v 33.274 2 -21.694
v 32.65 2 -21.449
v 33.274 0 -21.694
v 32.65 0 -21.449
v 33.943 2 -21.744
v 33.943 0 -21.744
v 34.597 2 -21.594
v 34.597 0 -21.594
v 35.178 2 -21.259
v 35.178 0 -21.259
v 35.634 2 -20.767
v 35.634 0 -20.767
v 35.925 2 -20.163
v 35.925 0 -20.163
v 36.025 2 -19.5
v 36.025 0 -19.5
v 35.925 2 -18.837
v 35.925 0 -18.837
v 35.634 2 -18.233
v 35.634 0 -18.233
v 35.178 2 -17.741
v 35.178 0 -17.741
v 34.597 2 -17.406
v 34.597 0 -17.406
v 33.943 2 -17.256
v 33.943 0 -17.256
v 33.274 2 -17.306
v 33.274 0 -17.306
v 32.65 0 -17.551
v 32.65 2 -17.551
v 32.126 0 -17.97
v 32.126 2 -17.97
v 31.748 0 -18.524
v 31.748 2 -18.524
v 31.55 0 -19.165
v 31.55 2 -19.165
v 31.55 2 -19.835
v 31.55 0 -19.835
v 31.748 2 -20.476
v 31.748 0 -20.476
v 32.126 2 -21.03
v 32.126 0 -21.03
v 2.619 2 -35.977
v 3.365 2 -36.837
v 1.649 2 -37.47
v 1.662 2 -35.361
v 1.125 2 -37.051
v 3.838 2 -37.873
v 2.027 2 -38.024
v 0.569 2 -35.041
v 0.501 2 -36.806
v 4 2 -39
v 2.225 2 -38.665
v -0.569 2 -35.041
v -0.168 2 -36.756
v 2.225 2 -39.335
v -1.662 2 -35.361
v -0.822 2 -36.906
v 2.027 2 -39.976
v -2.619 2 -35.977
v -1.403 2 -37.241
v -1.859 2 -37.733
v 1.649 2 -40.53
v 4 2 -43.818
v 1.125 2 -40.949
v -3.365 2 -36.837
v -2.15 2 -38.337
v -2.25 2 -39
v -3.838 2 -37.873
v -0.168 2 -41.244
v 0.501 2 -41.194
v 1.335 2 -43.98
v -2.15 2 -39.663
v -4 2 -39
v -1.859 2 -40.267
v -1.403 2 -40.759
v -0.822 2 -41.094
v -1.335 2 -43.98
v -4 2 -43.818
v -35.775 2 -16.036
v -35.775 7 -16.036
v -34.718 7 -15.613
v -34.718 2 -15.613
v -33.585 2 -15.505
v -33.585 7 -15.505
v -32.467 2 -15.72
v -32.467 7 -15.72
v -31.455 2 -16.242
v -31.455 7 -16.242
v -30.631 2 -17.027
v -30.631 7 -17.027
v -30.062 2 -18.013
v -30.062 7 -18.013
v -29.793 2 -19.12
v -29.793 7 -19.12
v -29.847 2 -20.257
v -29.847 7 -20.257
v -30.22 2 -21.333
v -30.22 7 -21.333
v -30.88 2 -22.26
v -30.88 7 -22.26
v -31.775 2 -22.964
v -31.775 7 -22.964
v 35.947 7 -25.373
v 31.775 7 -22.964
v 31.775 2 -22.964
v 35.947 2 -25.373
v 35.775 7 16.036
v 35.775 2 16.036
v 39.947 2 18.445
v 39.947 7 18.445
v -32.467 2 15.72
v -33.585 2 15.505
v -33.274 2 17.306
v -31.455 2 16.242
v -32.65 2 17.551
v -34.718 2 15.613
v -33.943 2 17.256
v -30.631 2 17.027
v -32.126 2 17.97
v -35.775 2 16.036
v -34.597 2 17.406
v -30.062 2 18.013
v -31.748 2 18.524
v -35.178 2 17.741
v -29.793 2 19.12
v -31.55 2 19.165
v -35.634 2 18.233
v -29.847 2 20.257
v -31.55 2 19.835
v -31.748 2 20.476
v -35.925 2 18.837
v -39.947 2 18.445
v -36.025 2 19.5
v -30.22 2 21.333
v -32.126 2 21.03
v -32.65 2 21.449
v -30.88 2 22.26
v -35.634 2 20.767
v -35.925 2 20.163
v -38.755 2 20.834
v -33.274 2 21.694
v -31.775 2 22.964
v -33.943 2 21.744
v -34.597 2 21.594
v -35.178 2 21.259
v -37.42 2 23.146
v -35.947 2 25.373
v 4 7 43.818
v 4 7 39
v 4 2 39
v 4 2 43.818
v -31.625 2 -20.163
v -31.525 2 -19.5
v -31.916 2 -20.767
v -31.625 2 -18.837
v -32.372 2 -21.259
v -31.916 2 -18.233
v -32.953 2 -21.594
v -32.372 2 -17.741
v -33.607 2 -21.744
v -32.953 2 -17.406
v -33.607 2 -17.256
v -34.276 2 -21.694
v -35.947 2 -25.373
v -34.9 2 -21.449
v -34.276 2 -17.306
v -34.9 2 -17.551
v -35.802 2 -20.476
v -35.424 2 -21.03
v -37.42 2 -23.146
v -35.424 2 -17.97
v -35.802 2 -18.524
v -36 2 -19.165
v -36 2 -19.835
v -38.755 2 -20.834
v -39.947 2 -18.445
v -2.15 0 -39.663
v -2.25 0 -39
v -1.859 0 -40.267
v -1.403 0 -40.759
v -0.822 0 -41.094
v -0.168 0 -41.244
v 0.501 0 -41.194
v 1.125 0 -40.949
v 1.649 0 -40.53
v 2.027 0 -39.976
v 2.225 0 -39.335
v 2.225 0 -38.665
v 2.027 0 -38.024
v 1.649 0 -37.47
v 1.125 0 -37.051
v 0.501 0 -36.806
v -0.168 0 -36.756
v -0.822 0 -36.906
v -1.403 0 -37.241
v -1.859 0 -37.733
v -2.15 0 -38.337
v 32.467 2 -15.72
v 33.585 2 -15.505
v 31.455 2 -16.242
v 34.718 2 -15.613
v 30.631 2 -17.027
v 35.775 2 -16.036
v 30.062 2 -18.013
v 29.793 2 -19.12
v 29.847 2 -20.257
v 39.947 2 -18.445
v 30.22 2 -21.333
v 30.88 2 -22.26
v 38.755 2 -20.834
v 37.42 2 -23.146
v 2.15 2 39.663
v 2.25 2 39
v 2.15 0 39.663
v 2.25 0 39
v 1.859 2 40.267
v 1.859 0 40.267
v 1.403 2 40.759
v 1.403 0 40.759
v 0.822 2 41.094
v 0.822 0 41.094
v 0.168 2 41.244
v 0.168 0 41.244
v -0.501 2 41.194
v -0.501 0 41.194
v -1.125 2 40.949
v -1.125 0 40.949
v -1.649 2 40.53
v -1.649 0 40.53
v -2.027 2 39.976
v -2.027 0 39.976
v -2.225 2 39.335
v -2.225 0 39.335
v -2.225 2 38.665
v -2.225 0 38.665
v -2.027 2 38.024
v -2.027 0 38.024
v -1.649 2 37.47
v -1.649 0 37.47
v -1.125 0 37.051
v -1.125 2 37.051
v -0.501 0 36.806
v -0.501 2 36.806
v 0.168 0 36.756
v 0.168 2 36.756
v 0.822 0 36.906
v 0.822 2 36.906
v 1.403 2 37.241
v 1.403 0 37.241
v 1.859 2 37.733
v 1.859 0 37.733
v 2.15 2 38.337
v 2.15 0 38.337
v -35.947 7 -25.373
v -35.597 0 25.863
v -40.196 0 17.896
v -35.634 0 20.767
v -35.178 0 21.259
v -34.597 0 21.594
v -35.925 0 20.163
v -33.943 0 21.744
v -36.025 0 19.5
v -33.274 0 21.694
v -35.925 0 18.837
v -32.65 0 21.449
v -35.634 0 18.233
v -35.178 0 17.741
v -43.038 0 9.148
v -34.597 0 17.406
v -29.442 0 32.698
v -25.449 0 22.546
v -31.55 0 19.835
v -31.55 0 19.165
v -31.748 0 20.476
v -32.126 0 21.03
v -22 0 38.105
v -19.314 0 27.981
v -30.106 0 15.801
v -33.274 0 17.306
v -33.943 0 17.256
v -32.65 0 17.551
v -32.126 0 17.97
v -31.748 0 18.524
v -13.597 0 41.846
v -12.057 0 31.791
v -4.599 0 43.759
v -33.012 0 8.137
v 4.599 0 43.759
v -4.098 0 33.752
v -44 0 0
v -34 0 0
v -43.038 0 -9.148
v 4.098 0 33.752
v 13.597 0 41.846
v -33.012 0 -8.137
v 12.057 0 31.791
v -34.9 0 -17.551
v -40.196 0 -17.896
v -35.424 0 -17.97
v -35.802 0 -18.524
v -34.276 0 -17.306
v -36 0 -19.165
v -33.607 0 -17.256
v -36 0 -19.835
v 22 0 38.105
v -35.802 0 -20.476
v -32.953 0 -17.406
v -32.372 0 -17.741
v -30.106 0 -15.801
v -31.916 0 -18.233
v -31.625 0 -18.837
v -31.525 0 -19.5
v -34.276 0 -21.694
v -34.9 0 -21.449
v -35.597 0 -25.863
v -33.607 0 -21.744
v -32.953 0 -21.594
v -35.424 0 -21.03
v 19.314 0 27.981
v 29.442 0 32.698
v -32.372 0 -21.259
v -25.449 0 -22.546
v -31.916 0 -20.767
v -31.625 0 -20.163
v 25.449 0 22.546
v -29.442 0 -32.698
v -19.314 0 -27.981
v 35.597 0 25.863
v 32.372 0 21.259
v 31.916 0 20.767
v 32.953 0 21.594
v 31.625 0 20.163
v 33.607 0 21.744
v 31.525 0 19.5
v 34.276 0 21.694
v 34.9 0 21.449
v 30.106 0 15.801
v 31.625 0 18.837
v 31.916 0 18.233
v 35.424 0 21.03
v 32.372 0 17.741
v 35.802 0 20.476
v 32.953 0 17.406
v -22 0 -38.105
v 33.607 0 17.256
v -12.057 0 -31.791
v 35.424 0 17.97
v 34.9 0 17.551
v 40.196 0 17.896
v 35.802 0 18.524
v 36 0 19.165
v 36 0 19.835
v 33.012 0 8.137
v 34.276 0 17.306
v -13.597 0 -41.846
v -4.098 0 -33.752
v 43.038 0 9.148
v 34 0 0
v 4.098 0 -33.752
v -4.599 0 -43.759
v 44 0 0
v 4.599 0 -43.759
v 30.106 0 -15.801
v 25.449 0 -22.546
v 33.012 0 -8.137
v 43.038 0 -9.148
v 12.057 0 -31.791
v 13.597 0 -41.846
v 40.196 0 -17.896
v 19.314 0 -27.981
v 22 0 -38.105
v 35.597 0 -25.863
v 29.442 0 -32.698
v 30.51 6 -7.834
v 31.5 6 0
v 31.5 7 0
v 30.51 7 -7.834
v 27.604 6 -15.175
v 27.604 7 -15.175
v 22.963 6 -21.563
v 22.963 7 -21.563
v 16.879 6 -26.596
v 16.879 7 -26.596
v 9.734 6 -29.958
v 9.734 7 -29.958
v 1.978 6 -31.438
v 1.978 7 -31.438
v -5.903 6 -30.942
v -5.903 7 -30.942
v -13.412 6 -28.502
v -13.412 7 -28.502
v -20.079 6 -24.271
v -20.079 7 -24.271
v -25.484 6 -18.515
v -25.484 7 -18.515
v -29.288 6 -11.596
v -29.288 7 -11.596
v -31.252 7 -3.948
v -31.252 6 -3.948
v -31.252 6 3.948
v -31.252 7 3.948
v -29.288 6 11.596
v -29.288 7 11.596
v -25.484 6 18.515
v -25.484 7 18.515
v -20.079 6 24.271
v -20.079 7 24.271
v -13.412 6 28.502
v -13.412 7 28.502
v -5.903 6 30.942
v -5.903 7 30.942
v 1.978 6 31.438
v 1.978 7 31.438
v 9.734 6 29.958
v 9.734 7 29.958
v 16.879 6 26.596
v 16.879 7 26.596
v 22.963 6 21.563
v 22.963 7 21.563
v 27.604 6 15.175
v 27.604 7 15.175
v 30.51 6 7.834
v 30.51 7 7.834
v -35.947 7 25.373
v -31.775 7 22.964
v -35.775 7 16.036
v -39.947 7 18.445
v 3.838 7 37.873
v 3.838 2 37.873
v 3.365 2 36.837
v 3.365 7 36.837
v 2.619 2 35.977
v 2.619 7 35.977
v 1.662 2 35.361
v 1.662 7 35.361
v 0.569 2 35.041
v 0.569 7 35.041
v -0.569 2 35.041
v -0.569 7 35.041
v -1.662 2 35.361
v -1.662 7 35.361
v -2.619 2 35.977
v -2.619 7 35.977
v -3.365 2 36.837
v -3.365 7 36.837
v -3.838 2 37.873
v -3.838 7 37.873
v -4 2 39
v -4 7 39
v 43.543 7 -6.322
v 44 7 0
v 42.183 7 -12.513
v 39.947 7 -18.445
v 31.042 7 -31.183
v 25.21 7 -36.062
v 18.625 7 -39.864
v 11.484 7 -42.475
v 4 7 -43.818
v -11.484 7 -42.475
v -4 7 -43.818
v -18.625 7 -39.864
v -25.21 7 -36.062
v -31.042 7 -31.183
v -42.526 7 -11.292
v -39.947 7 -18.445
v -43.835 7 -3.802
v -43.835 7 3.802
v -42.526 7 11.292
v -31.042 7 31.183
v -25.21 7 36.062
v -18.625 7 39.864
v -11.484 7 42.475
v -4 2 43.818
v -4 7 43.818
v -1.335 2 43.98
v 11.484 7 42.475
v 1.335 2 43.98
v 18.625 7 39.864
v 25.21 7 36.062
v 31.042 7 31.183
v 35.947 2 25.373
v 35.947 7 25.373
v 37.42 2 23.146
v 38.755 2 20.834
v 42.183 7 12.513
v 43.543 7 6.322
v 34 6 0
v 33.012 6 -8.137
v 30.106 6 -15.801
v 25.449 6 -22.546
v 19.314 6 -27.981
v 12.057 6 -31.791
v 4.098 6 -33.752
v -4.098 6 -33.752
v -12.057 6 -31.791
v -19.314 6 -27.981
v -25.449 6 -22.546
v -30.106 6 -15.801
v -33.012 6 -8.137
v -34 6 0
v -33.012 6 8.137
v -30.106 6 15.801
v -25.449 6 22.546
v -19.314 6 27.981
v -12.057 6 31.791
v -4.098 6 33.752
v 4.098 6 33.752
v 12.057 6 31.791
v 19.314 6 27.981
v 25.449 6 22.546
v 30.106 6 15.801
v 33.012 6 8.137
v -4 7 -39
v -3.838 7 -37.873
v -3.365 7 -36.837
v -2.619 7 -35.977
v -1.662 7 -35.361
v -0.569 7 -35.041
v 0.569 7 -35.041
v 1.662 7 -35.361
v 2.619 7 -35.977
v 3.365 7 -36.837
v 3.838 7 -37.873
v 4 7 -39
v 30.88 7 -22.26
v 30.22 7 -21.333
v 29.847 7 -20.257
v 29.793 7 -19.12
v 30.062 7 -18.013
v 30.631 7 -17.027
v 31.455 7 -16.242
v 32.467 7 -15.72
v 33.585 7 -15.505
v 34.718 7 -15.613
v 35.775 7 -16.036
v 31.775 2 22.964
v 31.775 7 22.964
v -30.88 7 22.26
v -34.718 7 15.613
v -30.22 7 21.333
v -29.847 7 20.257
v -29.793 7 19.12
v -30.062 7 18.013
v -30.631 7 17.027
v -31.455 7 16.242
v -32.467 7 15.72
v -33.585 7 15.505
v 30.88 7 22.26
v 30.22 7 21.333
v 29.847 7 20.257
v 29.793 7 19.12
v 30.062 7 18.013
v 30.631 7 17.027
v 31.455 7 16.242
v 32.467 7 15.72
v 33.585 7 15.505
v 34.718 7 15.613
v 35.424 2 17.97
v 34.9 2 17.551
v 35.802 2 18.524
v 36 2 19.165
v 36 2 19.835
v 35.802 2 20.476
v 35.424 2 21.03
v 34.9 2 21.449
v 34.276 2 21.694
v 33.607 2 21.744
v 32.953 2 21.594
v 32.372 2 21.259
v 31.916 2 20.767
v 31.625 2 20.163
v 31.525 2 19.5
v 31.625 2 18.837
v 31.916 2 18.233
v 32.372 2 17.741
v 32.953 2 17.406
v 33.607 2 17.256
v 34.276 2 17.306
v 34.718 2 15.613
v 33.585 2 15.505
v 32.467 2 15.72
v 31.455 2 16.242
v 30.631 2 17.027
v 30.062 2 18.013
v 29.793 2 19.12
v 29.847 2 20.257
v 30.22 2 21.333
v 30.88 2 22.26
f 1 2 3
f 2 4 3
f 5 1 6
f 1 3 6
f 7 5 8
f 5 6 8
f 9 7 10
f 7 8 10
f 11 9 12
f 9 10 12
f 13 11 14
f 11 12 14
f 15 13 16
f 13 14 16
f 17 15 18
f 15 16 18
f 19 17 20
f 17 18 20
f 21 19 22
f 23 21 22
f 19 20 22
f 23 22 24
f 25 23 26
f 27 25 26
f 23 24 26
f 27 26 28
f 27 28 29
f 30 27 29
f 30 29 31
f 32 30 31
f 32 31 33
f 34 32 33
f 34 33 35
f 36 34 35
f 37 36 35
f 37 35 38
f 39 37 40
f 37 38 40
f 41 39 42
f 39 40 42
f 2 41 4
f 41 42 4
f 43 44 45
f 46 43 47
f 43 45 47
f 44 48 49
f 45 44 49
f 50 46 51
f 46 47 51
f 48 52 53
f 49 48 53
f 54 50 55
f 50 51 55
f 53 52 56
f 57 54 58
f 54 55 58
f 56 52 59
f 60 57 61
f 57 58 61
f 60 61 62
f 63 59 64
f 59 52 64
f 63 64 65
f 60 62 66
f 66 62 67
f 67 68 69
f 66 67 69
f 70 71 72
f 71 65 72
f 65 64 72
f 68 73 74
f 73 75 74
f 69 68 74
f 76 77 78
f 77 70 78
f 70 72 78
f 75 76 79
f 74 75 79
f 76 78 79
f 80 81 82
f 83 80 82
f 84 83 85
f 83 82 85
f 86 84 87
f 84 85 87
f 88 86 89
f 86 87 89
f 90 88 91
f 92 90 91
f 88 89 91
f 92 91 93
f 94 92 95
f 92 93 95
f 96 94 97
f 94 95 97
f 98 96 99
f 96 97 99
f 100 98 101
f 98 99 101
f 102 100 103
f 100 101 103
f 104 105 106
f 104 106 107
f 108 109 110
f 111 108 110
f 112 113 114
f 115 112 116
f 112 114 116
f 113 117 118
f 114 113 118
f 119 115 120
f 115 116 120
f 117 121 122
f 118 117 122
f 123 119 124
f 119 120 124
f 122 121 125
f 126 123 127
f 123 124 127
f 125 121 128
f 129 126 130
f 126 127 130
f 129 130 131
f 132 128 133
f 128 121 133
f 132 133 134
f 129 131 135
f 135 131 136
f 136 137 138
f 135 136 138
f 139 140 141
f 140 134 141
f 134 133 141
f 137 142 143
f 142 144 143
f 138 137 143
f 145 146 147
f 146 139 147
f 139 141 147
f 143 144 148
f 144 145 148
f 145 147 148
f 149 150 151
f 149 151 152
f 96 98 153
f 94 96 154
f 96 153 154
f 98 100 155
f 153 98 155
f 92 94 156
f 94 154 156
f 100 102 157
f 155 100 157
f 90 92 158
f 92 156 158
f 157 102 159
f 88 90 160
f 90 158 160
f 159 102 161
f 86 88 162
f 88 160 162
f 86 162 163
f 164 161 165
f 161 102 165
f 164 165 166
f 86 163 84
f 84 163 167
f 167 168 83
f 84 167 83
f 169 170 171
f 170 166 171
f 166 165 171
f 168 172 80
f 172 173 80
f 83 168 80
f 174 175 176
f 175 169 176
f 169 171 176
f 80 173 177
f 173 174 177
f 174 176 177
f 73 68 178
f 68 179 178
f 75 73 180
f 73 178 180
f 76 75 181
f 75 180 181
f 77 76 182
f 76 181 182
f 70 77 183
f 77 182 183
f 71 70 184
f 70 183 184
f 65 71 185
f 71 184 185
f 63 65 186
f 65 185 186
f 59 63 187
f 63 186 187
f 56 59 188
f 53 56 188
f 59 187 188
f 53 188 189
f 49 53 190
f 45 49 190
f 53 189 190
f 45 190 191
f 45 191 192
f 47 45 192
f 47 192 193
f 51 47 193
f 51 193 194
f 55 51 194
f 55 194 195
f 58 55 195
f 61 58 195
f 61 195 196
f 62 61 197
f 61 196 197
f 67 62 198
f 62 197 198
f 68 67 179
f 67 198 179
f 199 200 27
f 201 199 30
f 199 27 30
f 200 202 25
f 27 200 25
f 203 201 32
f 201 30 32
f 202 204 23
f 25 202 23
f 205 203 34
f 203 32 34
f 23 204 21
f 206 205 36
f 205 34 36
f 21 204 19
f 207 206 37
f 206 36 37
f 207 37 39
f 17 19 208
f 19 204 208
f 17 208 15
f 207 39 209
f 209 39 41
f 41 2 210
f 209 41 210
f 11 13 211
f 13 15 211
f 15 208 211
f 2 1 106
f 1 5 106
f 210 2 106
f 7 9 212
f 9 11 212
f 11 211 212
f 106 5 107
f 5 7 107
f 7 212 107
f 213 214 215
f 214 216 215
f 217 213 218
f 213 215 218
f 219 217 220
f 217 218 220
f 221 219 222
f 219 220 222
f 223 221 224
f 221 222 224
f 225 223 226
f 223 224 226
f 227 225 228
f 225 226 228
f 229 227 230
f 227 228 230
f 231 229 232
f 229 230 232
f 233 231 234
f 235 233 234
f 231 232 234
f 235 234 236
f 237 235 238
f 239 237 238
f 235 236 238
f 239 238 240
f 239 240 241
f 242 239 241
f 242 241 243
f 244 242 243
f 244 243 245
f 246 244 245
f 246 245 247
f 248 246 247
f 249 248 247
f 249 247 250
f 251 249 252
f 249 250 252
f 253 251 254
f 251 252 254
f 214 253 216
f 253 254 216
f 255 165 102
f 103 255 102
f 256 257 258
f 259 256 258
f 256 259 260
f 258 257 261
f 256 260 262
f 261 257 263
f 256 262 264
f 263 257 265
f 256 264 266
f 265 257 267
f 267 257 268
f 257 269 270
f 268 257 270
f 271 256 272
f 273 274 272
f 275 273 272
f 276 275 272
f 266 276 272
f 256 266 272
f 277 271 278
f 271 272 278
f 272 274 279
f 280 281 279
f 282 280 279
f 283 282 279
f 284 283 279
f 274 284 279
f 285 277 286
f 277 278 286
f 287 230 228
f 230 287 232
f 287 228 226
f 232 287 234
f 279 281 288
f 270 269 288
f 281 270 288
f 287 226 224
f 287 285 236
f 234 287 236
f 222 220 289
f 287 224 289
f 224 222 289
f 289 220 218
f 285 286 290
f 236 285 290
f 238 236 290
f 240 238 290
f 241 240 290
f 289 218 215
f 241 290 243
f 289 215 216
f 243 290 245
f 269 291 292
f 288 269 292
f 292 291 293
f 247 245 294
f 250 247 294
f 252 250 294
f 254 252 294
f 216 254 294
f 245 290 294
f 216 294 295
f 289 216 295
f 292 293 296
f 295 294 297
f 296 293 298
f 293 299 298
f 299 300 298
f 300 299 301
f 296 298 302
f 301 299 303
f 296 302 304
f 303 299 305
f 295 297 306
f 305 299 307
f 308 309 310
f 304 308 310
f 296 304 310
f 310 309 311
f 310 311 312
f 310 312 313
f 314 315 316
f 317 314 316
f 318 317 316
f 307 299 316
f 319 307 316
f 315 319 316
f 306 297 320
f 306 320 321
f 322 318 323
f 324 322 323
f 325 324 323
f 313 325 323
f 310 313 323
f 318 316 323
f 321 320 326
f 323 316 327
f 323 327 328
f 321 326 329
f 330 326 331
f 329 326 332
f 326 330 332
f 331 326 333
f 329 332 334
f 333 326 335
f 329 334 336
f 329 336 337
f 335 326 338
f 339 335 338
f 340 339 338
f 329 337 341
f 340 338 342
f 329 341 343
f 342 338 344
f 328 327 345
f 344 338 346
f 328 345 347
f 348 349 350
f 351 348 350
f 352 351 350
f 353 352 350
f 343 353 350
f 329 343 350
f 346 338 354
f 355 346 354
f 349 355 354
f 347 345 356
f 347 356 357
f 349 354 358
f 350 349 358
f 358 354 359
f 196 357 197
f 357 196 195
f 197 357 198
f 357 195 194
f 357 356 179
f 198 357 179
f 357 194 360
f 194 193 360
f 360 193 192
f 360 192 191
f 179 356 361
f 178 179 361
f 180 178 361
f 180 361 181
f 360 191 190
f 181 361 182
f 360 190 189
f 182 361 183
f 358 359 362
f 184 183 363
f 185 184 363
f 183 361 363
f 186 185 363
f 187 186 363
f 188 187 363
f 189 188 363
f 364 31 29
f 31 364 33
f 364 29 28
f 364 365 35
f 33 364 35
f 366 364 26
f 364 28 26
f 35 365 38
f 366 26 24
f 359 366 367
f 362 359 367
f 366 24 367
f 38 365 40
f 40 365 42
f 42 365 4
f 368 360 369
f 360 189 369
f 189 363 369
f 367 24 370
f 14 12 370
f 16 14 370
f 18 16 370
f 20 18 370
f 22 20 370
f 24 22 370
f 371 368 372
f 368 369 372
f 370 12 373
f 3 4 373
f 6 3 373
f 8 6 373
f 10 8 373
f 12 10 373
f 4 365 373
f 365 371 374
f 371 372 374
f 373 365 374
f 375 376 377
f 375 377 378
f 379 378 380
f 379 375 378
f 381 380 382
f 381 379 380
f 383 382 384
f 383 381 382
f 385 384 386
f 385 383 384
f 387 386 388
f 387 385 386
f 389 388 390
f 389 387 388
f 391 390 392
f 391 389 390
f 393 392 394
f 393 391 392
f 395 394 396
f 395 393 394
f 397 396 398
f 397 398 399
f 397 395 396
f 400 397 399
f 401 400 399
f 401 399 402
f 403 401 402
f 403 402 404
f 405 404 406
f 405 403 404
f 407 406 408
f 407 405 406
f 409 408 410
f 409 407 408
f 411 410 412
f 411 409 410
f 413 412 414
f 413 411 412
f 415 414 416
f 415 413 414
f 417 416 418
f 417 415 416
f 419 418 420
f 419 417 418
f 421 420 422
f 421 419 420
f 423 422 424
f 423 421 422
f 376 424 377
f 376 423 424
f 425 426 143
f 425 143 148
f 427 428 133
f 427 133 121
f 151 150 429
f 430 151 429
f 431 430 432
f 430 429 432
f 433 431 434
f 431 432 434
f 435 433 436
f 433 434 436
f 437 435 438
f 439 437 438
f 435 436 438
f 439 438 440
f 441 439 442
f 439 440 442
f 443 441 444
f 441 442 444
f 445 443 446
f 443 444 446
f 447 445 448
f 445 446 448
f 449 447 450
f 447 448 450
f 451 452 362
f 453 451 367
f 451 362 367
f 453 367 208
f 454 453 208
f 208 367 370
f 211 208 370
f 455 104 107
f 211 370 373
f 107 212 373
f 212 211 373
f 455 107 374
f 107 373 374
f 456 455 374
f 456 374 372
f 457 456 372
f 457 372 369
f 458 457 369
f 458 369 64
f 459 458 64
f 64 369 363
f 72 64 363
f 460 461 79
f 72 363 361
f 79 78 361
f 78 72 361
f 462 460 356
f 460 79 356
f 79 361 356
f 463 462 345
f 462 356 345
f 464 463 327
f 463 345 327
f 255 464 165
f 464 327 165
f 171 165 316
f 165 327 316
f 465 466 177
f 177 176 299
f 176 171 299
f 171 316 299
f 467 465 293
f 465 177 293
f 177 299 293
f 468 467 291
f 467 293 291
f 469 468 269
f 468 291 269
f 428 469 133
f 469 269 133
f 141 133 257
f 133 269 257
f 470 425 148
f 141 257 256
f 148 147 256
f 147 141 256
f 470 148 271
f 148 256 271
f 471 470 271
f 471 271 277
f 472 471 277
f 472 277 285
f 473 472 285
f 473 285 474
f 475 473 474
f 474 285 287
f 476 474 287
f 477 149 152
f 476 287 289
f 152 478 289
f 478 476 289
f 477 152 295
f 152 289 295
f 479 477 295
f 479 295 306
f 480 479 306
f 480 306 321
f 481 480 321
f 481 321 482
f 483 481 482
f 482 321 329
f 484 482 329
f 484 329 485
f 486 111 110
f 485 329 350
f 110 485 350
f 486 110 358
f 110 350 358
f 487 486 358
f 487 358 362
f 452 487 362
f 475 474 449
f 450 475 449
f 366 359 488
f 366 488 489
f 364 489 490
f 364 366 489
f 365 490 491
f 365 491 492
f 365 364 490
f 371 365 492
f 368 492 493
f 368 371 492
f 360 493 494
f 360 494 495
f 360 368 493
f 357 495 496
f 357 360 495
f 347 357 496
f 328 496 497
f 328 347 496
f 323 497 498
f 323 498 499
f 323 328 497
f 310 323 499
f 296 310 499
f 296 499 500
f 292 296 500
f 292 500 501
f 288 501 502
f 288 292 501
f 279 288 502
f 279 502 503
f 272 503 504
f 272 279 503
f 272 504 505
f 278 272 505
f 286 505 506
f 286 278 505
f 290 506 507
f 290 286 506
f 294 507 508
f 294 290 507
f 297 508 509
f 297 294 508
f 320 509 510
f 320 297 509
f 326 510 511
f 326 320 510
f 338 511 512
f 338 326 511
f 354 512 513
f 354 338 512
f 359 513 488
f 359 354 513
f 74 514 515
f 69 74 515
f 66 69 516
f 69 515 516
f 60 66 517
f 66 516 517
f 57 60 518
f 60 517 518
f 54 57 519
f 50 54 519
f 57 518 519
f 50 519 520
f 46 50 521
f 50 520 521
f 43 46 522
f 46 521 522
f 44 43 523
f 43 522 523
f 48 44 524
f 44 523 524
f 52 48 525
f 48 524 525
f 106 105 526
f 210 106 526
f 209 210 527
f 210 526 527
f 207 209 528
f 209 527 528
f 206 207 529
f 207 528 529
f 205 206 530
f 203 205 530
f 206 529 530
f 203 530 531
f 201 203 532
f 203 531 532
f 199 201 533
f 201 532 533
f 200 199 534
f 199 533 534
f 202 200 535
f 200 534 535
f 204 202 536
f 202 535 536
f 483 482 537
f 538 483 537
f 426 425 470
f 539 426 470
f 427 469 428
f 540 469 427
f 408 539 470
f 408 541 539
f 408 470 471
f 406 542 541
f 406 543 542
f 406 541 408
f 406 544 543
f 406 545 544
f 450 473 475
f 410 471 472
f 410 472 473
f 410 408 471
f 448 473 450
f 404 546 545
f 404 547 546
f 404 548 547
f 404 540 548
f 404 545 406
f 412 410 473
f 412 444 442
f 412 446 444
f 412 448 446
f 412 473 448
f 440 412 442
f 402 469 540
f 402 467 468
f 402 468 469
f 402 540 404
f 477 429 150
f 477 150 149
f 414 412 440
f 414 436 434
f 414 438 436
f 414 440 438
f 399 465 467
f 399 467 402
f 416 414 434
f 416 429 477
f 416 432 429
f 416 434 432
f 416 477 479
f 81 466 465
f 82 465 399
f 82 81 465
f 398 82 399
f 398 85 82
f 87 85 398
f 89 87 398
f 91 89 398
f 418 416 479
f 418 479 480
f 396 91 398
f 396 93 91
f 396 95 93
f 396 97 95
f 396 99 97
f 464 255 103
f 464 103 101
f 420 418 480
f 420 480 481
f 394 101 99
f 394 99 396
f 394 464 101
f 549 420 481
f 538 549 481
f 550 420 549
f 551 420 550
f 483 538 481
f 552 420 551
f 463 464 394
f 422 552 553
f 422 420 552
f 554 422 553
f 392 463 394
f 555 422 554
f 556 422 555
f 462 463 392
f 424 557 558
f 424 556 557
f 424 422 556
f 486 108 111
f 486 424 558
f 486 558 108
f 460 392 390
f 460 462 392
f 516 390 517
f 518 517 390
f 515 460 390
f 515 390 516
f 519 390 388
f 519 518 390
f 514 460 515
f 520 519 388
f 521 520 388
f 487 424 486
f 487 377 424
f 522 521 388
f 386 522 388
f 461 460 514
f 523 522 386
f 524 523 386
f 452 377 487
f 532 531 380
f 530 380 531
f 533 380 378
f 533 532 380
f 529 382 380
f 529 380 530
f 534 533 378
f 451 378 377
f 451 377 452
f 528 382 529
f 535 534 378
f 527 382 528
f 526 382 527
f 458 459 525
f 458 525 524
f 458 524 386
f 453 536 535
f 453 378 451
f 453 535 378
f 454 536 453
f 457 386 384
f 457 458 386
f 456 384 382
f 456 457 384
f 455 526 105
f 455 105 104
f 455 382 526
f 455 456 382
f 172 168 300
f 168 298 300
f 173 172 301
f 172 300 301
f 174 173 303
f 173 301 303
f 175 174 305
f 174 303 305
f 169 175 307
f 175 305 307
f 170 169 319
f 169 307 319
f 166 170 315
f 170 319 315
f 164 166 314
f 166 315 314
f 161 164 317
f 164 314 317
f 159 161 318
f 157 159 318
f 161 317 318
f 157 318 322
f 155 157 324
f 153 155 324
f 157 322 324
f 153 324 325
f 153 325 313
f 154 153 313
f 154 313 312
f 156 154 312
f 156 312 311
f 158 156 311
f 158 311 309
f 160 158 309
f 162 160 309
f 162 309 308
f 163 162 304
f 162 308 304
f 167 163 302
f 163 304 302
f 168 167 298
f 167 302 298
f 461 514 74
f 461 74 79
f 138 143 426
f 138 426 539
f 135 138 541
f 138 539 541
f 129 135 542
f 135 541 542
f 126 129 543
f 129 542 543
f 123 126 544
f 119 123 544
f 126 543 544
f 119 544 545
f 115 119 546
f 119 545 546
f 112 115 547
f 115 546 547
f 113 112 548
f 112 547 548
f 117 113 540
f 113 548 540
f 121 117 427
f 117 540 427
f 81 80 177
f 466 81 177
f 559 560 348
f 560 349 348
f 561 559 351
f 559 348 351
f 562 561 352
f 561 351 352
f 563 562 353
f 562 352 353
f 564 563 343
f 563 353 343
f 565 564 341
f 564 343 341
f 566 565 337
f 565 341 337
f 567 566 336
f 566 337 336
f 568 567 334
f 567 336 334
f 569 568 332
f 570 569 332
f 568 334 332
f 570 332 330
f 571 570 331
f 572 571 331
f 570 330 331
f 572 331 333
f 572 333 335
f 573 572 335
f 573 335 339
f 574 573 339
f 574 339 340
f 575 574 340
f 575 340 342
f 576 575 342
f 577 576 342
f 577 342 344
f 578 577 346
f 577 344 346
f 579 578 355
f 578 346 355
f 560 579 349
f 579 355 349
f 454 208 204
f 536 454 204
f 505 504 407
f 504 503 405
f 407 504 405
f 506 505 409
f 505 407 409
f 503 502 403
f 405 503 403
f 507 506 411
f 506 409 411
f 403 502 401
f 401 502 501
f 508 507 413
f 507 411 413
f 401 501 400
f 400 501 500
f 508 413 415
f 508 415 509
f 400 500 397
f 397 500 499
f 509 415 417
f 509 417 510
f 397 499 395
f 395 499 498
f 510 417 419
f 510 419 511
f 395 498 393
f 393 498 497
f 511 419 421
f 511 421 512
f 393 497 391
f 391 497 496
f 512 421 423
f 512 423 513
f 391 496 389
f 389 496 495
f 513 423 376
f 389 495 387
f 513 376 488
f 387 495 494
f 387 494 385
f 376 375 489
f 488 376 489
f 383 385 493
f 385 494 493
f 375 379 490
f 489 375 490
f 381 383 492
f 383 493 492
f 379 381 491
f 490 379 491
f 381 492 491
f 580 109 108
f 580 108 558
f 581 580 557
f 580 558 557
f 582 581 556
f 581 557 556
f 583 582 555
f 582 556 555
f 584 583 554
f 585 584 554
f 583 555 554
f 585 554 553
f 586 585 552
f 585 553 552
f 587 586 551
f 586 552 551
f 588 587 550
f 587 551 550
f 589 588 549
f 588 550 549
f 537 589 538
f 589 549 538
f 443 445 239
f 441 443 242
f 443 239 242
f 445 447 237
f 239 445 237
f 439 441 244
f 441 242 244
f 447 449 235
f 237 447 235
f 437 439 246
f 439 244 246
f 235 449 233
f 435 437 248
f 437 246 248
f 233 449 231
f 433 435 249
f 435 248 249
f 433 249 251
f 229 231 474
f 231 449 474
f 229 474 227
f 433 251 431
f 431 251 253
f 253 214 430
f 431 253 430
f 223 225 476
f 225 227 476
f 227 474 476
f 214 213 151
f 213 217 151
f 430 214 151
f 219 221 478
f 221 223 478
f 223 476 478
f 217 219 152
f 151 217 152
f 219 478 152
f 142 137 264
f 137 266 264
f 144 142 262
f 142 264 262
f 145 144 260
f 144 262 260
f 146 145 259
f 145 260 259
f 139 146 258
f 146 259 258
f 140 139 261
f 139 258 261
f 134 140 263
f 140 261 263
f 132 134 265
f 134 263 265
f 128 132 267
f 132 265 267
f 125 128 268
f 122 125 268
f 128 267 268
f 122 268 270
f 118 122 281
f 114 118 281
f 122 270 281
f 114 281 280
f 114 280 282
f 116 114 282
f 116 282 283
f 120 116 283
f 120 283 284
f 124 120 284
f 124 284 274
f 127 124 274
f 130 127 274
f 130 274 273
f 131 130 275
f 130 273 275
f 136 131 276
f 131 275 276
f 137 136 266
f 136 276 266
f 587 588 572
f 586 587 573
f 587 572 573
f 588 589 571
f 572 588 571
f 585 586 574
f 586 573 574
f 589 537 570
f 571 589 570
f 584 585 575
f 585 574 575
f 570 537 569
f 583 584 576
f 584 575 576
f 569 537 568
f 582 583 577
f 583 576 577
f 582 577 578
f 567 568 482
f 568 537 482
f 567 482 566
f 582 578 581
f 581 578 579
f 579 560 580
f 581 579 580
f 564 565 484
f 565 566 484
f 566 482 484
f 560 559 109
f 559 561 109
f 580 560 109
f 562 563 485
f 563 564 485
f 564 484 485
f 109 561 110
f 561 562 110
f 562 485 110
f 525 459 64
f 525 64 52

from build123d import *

# Parameters (mm, degrees)
SKETCH_1_R                   = 44
SKETCH_1_R_2                 = 34
EXTRUDE_1_DEPTH              = 6
SKETCH_2_R                   = 44
SKETCH_2_R_2                 = 31.5
EXTRUDE_2_DEPTH              = 1
HOLE_WIZARD_M4_1_D           = 4.5
HOLE_WIZARD_M4_1_CBORE_D     = 8
HOLE_WIZARD_M4_1_CBORE_DEPTH = 5
PATTERN_CIRCULAR_1_COUNT     = 6
CUT_EXTRUDE_1_DEPTH          = 5
PATTERN_CIRCULAR_2_COUNT     = 6


with BuildPart() as part:
    # 스케치1 → 보스-돌출1 (new body)
    with BuildSketch(Plane(origin=(0, 0, 0), x_dir=(1, 0, 0), z_dir=(0, 1, 0))):
        Circle(SKETCH_1_R)
        Circle(SKETCH_1_R_2, mode=Mode.SUBTRACT)
    extrude(amount=EXTRUDE_1_DEPTH)

    # 스케치2 → 보스-돌출2 (add)
    with BuildSketch(Plane(origin=(0, 6, 0), x_dir=(1, 0, 0), z_dir=(0, 1, 0))):
        Circle(SKETCH_2_R)
        Circle(SKETCH_2_R_2, mode=Mode.SUBTRACT)
    extrude(amount=EXTRUDE_2_DEPTH)

    # M4 육각 소켓 머리 캡 나사용 카운터보어1 (through all)
    with Locations(Plane(origin=(0, 7, 0), x_dir=(1, 0, 0), z_dir=(0, 1, 0))):
        with Locations((0, 39)):
            hole_wizard_m4_1 = CounterBoreHole(HOLE_WIZARD_M4_1_D / 2, HOLE_WIZARD_M4_1_CBORE_D / 2, HOLE_WIZARD_M4_1_CBORE_DEPTH)

    # 원형 패턴1: M4 육각 소켓 머리 캡 나사용 카운터보어1 ×6 about axis
    pattern_circular_1_axis = Axis((0, 0, 0), (0, 1, 0))
    for i in range(1, PATTERN_CIRCULAR_1_COUNT):
        add(hole_wizard_m4_1.rotate(pattern_circular_1_axis, i * 360 / PATTERN_CIRCULAR_1_COUNT), mode=Mode.SUBTRACT)

    # 스케치7 → 컷-돌출1 (cut, symmetric)
    with BuildSketch(Plane(origin=(0, 7, 0), x_dir=(1, 0, 0), z_dir=(0, 1, 0))):
        with BuildLine():
            Line((-4, 39), (-4, 44))
            Line((-4, 44), (4, 44))
            Line((4, 44), (4, 39))
            ThreePointArc((4, 39), (0, 43), (-4, 39))
        make_face()
    cut_extrude_1 = extrude(amount=CUT_EXTRUDE_1_DEPTH, both=True, mode=Mode.SUBTRACT)

    # 원형 패턴2: 컷-돌출1 ×6 about axis
    pattern_circular_2_axis = Axis((0, 0, 0), (0, 1, 0))
    for i in range(1, PATTERN_CIRCULAR_2_COUNT):
        add(cut_extrude_1.rotate(pattern_circular_2_axis, i * 360 / PATTERN_CIRCULAR_2_COUNT), mode=Mode.SUBTRACT)


solid = part.part
